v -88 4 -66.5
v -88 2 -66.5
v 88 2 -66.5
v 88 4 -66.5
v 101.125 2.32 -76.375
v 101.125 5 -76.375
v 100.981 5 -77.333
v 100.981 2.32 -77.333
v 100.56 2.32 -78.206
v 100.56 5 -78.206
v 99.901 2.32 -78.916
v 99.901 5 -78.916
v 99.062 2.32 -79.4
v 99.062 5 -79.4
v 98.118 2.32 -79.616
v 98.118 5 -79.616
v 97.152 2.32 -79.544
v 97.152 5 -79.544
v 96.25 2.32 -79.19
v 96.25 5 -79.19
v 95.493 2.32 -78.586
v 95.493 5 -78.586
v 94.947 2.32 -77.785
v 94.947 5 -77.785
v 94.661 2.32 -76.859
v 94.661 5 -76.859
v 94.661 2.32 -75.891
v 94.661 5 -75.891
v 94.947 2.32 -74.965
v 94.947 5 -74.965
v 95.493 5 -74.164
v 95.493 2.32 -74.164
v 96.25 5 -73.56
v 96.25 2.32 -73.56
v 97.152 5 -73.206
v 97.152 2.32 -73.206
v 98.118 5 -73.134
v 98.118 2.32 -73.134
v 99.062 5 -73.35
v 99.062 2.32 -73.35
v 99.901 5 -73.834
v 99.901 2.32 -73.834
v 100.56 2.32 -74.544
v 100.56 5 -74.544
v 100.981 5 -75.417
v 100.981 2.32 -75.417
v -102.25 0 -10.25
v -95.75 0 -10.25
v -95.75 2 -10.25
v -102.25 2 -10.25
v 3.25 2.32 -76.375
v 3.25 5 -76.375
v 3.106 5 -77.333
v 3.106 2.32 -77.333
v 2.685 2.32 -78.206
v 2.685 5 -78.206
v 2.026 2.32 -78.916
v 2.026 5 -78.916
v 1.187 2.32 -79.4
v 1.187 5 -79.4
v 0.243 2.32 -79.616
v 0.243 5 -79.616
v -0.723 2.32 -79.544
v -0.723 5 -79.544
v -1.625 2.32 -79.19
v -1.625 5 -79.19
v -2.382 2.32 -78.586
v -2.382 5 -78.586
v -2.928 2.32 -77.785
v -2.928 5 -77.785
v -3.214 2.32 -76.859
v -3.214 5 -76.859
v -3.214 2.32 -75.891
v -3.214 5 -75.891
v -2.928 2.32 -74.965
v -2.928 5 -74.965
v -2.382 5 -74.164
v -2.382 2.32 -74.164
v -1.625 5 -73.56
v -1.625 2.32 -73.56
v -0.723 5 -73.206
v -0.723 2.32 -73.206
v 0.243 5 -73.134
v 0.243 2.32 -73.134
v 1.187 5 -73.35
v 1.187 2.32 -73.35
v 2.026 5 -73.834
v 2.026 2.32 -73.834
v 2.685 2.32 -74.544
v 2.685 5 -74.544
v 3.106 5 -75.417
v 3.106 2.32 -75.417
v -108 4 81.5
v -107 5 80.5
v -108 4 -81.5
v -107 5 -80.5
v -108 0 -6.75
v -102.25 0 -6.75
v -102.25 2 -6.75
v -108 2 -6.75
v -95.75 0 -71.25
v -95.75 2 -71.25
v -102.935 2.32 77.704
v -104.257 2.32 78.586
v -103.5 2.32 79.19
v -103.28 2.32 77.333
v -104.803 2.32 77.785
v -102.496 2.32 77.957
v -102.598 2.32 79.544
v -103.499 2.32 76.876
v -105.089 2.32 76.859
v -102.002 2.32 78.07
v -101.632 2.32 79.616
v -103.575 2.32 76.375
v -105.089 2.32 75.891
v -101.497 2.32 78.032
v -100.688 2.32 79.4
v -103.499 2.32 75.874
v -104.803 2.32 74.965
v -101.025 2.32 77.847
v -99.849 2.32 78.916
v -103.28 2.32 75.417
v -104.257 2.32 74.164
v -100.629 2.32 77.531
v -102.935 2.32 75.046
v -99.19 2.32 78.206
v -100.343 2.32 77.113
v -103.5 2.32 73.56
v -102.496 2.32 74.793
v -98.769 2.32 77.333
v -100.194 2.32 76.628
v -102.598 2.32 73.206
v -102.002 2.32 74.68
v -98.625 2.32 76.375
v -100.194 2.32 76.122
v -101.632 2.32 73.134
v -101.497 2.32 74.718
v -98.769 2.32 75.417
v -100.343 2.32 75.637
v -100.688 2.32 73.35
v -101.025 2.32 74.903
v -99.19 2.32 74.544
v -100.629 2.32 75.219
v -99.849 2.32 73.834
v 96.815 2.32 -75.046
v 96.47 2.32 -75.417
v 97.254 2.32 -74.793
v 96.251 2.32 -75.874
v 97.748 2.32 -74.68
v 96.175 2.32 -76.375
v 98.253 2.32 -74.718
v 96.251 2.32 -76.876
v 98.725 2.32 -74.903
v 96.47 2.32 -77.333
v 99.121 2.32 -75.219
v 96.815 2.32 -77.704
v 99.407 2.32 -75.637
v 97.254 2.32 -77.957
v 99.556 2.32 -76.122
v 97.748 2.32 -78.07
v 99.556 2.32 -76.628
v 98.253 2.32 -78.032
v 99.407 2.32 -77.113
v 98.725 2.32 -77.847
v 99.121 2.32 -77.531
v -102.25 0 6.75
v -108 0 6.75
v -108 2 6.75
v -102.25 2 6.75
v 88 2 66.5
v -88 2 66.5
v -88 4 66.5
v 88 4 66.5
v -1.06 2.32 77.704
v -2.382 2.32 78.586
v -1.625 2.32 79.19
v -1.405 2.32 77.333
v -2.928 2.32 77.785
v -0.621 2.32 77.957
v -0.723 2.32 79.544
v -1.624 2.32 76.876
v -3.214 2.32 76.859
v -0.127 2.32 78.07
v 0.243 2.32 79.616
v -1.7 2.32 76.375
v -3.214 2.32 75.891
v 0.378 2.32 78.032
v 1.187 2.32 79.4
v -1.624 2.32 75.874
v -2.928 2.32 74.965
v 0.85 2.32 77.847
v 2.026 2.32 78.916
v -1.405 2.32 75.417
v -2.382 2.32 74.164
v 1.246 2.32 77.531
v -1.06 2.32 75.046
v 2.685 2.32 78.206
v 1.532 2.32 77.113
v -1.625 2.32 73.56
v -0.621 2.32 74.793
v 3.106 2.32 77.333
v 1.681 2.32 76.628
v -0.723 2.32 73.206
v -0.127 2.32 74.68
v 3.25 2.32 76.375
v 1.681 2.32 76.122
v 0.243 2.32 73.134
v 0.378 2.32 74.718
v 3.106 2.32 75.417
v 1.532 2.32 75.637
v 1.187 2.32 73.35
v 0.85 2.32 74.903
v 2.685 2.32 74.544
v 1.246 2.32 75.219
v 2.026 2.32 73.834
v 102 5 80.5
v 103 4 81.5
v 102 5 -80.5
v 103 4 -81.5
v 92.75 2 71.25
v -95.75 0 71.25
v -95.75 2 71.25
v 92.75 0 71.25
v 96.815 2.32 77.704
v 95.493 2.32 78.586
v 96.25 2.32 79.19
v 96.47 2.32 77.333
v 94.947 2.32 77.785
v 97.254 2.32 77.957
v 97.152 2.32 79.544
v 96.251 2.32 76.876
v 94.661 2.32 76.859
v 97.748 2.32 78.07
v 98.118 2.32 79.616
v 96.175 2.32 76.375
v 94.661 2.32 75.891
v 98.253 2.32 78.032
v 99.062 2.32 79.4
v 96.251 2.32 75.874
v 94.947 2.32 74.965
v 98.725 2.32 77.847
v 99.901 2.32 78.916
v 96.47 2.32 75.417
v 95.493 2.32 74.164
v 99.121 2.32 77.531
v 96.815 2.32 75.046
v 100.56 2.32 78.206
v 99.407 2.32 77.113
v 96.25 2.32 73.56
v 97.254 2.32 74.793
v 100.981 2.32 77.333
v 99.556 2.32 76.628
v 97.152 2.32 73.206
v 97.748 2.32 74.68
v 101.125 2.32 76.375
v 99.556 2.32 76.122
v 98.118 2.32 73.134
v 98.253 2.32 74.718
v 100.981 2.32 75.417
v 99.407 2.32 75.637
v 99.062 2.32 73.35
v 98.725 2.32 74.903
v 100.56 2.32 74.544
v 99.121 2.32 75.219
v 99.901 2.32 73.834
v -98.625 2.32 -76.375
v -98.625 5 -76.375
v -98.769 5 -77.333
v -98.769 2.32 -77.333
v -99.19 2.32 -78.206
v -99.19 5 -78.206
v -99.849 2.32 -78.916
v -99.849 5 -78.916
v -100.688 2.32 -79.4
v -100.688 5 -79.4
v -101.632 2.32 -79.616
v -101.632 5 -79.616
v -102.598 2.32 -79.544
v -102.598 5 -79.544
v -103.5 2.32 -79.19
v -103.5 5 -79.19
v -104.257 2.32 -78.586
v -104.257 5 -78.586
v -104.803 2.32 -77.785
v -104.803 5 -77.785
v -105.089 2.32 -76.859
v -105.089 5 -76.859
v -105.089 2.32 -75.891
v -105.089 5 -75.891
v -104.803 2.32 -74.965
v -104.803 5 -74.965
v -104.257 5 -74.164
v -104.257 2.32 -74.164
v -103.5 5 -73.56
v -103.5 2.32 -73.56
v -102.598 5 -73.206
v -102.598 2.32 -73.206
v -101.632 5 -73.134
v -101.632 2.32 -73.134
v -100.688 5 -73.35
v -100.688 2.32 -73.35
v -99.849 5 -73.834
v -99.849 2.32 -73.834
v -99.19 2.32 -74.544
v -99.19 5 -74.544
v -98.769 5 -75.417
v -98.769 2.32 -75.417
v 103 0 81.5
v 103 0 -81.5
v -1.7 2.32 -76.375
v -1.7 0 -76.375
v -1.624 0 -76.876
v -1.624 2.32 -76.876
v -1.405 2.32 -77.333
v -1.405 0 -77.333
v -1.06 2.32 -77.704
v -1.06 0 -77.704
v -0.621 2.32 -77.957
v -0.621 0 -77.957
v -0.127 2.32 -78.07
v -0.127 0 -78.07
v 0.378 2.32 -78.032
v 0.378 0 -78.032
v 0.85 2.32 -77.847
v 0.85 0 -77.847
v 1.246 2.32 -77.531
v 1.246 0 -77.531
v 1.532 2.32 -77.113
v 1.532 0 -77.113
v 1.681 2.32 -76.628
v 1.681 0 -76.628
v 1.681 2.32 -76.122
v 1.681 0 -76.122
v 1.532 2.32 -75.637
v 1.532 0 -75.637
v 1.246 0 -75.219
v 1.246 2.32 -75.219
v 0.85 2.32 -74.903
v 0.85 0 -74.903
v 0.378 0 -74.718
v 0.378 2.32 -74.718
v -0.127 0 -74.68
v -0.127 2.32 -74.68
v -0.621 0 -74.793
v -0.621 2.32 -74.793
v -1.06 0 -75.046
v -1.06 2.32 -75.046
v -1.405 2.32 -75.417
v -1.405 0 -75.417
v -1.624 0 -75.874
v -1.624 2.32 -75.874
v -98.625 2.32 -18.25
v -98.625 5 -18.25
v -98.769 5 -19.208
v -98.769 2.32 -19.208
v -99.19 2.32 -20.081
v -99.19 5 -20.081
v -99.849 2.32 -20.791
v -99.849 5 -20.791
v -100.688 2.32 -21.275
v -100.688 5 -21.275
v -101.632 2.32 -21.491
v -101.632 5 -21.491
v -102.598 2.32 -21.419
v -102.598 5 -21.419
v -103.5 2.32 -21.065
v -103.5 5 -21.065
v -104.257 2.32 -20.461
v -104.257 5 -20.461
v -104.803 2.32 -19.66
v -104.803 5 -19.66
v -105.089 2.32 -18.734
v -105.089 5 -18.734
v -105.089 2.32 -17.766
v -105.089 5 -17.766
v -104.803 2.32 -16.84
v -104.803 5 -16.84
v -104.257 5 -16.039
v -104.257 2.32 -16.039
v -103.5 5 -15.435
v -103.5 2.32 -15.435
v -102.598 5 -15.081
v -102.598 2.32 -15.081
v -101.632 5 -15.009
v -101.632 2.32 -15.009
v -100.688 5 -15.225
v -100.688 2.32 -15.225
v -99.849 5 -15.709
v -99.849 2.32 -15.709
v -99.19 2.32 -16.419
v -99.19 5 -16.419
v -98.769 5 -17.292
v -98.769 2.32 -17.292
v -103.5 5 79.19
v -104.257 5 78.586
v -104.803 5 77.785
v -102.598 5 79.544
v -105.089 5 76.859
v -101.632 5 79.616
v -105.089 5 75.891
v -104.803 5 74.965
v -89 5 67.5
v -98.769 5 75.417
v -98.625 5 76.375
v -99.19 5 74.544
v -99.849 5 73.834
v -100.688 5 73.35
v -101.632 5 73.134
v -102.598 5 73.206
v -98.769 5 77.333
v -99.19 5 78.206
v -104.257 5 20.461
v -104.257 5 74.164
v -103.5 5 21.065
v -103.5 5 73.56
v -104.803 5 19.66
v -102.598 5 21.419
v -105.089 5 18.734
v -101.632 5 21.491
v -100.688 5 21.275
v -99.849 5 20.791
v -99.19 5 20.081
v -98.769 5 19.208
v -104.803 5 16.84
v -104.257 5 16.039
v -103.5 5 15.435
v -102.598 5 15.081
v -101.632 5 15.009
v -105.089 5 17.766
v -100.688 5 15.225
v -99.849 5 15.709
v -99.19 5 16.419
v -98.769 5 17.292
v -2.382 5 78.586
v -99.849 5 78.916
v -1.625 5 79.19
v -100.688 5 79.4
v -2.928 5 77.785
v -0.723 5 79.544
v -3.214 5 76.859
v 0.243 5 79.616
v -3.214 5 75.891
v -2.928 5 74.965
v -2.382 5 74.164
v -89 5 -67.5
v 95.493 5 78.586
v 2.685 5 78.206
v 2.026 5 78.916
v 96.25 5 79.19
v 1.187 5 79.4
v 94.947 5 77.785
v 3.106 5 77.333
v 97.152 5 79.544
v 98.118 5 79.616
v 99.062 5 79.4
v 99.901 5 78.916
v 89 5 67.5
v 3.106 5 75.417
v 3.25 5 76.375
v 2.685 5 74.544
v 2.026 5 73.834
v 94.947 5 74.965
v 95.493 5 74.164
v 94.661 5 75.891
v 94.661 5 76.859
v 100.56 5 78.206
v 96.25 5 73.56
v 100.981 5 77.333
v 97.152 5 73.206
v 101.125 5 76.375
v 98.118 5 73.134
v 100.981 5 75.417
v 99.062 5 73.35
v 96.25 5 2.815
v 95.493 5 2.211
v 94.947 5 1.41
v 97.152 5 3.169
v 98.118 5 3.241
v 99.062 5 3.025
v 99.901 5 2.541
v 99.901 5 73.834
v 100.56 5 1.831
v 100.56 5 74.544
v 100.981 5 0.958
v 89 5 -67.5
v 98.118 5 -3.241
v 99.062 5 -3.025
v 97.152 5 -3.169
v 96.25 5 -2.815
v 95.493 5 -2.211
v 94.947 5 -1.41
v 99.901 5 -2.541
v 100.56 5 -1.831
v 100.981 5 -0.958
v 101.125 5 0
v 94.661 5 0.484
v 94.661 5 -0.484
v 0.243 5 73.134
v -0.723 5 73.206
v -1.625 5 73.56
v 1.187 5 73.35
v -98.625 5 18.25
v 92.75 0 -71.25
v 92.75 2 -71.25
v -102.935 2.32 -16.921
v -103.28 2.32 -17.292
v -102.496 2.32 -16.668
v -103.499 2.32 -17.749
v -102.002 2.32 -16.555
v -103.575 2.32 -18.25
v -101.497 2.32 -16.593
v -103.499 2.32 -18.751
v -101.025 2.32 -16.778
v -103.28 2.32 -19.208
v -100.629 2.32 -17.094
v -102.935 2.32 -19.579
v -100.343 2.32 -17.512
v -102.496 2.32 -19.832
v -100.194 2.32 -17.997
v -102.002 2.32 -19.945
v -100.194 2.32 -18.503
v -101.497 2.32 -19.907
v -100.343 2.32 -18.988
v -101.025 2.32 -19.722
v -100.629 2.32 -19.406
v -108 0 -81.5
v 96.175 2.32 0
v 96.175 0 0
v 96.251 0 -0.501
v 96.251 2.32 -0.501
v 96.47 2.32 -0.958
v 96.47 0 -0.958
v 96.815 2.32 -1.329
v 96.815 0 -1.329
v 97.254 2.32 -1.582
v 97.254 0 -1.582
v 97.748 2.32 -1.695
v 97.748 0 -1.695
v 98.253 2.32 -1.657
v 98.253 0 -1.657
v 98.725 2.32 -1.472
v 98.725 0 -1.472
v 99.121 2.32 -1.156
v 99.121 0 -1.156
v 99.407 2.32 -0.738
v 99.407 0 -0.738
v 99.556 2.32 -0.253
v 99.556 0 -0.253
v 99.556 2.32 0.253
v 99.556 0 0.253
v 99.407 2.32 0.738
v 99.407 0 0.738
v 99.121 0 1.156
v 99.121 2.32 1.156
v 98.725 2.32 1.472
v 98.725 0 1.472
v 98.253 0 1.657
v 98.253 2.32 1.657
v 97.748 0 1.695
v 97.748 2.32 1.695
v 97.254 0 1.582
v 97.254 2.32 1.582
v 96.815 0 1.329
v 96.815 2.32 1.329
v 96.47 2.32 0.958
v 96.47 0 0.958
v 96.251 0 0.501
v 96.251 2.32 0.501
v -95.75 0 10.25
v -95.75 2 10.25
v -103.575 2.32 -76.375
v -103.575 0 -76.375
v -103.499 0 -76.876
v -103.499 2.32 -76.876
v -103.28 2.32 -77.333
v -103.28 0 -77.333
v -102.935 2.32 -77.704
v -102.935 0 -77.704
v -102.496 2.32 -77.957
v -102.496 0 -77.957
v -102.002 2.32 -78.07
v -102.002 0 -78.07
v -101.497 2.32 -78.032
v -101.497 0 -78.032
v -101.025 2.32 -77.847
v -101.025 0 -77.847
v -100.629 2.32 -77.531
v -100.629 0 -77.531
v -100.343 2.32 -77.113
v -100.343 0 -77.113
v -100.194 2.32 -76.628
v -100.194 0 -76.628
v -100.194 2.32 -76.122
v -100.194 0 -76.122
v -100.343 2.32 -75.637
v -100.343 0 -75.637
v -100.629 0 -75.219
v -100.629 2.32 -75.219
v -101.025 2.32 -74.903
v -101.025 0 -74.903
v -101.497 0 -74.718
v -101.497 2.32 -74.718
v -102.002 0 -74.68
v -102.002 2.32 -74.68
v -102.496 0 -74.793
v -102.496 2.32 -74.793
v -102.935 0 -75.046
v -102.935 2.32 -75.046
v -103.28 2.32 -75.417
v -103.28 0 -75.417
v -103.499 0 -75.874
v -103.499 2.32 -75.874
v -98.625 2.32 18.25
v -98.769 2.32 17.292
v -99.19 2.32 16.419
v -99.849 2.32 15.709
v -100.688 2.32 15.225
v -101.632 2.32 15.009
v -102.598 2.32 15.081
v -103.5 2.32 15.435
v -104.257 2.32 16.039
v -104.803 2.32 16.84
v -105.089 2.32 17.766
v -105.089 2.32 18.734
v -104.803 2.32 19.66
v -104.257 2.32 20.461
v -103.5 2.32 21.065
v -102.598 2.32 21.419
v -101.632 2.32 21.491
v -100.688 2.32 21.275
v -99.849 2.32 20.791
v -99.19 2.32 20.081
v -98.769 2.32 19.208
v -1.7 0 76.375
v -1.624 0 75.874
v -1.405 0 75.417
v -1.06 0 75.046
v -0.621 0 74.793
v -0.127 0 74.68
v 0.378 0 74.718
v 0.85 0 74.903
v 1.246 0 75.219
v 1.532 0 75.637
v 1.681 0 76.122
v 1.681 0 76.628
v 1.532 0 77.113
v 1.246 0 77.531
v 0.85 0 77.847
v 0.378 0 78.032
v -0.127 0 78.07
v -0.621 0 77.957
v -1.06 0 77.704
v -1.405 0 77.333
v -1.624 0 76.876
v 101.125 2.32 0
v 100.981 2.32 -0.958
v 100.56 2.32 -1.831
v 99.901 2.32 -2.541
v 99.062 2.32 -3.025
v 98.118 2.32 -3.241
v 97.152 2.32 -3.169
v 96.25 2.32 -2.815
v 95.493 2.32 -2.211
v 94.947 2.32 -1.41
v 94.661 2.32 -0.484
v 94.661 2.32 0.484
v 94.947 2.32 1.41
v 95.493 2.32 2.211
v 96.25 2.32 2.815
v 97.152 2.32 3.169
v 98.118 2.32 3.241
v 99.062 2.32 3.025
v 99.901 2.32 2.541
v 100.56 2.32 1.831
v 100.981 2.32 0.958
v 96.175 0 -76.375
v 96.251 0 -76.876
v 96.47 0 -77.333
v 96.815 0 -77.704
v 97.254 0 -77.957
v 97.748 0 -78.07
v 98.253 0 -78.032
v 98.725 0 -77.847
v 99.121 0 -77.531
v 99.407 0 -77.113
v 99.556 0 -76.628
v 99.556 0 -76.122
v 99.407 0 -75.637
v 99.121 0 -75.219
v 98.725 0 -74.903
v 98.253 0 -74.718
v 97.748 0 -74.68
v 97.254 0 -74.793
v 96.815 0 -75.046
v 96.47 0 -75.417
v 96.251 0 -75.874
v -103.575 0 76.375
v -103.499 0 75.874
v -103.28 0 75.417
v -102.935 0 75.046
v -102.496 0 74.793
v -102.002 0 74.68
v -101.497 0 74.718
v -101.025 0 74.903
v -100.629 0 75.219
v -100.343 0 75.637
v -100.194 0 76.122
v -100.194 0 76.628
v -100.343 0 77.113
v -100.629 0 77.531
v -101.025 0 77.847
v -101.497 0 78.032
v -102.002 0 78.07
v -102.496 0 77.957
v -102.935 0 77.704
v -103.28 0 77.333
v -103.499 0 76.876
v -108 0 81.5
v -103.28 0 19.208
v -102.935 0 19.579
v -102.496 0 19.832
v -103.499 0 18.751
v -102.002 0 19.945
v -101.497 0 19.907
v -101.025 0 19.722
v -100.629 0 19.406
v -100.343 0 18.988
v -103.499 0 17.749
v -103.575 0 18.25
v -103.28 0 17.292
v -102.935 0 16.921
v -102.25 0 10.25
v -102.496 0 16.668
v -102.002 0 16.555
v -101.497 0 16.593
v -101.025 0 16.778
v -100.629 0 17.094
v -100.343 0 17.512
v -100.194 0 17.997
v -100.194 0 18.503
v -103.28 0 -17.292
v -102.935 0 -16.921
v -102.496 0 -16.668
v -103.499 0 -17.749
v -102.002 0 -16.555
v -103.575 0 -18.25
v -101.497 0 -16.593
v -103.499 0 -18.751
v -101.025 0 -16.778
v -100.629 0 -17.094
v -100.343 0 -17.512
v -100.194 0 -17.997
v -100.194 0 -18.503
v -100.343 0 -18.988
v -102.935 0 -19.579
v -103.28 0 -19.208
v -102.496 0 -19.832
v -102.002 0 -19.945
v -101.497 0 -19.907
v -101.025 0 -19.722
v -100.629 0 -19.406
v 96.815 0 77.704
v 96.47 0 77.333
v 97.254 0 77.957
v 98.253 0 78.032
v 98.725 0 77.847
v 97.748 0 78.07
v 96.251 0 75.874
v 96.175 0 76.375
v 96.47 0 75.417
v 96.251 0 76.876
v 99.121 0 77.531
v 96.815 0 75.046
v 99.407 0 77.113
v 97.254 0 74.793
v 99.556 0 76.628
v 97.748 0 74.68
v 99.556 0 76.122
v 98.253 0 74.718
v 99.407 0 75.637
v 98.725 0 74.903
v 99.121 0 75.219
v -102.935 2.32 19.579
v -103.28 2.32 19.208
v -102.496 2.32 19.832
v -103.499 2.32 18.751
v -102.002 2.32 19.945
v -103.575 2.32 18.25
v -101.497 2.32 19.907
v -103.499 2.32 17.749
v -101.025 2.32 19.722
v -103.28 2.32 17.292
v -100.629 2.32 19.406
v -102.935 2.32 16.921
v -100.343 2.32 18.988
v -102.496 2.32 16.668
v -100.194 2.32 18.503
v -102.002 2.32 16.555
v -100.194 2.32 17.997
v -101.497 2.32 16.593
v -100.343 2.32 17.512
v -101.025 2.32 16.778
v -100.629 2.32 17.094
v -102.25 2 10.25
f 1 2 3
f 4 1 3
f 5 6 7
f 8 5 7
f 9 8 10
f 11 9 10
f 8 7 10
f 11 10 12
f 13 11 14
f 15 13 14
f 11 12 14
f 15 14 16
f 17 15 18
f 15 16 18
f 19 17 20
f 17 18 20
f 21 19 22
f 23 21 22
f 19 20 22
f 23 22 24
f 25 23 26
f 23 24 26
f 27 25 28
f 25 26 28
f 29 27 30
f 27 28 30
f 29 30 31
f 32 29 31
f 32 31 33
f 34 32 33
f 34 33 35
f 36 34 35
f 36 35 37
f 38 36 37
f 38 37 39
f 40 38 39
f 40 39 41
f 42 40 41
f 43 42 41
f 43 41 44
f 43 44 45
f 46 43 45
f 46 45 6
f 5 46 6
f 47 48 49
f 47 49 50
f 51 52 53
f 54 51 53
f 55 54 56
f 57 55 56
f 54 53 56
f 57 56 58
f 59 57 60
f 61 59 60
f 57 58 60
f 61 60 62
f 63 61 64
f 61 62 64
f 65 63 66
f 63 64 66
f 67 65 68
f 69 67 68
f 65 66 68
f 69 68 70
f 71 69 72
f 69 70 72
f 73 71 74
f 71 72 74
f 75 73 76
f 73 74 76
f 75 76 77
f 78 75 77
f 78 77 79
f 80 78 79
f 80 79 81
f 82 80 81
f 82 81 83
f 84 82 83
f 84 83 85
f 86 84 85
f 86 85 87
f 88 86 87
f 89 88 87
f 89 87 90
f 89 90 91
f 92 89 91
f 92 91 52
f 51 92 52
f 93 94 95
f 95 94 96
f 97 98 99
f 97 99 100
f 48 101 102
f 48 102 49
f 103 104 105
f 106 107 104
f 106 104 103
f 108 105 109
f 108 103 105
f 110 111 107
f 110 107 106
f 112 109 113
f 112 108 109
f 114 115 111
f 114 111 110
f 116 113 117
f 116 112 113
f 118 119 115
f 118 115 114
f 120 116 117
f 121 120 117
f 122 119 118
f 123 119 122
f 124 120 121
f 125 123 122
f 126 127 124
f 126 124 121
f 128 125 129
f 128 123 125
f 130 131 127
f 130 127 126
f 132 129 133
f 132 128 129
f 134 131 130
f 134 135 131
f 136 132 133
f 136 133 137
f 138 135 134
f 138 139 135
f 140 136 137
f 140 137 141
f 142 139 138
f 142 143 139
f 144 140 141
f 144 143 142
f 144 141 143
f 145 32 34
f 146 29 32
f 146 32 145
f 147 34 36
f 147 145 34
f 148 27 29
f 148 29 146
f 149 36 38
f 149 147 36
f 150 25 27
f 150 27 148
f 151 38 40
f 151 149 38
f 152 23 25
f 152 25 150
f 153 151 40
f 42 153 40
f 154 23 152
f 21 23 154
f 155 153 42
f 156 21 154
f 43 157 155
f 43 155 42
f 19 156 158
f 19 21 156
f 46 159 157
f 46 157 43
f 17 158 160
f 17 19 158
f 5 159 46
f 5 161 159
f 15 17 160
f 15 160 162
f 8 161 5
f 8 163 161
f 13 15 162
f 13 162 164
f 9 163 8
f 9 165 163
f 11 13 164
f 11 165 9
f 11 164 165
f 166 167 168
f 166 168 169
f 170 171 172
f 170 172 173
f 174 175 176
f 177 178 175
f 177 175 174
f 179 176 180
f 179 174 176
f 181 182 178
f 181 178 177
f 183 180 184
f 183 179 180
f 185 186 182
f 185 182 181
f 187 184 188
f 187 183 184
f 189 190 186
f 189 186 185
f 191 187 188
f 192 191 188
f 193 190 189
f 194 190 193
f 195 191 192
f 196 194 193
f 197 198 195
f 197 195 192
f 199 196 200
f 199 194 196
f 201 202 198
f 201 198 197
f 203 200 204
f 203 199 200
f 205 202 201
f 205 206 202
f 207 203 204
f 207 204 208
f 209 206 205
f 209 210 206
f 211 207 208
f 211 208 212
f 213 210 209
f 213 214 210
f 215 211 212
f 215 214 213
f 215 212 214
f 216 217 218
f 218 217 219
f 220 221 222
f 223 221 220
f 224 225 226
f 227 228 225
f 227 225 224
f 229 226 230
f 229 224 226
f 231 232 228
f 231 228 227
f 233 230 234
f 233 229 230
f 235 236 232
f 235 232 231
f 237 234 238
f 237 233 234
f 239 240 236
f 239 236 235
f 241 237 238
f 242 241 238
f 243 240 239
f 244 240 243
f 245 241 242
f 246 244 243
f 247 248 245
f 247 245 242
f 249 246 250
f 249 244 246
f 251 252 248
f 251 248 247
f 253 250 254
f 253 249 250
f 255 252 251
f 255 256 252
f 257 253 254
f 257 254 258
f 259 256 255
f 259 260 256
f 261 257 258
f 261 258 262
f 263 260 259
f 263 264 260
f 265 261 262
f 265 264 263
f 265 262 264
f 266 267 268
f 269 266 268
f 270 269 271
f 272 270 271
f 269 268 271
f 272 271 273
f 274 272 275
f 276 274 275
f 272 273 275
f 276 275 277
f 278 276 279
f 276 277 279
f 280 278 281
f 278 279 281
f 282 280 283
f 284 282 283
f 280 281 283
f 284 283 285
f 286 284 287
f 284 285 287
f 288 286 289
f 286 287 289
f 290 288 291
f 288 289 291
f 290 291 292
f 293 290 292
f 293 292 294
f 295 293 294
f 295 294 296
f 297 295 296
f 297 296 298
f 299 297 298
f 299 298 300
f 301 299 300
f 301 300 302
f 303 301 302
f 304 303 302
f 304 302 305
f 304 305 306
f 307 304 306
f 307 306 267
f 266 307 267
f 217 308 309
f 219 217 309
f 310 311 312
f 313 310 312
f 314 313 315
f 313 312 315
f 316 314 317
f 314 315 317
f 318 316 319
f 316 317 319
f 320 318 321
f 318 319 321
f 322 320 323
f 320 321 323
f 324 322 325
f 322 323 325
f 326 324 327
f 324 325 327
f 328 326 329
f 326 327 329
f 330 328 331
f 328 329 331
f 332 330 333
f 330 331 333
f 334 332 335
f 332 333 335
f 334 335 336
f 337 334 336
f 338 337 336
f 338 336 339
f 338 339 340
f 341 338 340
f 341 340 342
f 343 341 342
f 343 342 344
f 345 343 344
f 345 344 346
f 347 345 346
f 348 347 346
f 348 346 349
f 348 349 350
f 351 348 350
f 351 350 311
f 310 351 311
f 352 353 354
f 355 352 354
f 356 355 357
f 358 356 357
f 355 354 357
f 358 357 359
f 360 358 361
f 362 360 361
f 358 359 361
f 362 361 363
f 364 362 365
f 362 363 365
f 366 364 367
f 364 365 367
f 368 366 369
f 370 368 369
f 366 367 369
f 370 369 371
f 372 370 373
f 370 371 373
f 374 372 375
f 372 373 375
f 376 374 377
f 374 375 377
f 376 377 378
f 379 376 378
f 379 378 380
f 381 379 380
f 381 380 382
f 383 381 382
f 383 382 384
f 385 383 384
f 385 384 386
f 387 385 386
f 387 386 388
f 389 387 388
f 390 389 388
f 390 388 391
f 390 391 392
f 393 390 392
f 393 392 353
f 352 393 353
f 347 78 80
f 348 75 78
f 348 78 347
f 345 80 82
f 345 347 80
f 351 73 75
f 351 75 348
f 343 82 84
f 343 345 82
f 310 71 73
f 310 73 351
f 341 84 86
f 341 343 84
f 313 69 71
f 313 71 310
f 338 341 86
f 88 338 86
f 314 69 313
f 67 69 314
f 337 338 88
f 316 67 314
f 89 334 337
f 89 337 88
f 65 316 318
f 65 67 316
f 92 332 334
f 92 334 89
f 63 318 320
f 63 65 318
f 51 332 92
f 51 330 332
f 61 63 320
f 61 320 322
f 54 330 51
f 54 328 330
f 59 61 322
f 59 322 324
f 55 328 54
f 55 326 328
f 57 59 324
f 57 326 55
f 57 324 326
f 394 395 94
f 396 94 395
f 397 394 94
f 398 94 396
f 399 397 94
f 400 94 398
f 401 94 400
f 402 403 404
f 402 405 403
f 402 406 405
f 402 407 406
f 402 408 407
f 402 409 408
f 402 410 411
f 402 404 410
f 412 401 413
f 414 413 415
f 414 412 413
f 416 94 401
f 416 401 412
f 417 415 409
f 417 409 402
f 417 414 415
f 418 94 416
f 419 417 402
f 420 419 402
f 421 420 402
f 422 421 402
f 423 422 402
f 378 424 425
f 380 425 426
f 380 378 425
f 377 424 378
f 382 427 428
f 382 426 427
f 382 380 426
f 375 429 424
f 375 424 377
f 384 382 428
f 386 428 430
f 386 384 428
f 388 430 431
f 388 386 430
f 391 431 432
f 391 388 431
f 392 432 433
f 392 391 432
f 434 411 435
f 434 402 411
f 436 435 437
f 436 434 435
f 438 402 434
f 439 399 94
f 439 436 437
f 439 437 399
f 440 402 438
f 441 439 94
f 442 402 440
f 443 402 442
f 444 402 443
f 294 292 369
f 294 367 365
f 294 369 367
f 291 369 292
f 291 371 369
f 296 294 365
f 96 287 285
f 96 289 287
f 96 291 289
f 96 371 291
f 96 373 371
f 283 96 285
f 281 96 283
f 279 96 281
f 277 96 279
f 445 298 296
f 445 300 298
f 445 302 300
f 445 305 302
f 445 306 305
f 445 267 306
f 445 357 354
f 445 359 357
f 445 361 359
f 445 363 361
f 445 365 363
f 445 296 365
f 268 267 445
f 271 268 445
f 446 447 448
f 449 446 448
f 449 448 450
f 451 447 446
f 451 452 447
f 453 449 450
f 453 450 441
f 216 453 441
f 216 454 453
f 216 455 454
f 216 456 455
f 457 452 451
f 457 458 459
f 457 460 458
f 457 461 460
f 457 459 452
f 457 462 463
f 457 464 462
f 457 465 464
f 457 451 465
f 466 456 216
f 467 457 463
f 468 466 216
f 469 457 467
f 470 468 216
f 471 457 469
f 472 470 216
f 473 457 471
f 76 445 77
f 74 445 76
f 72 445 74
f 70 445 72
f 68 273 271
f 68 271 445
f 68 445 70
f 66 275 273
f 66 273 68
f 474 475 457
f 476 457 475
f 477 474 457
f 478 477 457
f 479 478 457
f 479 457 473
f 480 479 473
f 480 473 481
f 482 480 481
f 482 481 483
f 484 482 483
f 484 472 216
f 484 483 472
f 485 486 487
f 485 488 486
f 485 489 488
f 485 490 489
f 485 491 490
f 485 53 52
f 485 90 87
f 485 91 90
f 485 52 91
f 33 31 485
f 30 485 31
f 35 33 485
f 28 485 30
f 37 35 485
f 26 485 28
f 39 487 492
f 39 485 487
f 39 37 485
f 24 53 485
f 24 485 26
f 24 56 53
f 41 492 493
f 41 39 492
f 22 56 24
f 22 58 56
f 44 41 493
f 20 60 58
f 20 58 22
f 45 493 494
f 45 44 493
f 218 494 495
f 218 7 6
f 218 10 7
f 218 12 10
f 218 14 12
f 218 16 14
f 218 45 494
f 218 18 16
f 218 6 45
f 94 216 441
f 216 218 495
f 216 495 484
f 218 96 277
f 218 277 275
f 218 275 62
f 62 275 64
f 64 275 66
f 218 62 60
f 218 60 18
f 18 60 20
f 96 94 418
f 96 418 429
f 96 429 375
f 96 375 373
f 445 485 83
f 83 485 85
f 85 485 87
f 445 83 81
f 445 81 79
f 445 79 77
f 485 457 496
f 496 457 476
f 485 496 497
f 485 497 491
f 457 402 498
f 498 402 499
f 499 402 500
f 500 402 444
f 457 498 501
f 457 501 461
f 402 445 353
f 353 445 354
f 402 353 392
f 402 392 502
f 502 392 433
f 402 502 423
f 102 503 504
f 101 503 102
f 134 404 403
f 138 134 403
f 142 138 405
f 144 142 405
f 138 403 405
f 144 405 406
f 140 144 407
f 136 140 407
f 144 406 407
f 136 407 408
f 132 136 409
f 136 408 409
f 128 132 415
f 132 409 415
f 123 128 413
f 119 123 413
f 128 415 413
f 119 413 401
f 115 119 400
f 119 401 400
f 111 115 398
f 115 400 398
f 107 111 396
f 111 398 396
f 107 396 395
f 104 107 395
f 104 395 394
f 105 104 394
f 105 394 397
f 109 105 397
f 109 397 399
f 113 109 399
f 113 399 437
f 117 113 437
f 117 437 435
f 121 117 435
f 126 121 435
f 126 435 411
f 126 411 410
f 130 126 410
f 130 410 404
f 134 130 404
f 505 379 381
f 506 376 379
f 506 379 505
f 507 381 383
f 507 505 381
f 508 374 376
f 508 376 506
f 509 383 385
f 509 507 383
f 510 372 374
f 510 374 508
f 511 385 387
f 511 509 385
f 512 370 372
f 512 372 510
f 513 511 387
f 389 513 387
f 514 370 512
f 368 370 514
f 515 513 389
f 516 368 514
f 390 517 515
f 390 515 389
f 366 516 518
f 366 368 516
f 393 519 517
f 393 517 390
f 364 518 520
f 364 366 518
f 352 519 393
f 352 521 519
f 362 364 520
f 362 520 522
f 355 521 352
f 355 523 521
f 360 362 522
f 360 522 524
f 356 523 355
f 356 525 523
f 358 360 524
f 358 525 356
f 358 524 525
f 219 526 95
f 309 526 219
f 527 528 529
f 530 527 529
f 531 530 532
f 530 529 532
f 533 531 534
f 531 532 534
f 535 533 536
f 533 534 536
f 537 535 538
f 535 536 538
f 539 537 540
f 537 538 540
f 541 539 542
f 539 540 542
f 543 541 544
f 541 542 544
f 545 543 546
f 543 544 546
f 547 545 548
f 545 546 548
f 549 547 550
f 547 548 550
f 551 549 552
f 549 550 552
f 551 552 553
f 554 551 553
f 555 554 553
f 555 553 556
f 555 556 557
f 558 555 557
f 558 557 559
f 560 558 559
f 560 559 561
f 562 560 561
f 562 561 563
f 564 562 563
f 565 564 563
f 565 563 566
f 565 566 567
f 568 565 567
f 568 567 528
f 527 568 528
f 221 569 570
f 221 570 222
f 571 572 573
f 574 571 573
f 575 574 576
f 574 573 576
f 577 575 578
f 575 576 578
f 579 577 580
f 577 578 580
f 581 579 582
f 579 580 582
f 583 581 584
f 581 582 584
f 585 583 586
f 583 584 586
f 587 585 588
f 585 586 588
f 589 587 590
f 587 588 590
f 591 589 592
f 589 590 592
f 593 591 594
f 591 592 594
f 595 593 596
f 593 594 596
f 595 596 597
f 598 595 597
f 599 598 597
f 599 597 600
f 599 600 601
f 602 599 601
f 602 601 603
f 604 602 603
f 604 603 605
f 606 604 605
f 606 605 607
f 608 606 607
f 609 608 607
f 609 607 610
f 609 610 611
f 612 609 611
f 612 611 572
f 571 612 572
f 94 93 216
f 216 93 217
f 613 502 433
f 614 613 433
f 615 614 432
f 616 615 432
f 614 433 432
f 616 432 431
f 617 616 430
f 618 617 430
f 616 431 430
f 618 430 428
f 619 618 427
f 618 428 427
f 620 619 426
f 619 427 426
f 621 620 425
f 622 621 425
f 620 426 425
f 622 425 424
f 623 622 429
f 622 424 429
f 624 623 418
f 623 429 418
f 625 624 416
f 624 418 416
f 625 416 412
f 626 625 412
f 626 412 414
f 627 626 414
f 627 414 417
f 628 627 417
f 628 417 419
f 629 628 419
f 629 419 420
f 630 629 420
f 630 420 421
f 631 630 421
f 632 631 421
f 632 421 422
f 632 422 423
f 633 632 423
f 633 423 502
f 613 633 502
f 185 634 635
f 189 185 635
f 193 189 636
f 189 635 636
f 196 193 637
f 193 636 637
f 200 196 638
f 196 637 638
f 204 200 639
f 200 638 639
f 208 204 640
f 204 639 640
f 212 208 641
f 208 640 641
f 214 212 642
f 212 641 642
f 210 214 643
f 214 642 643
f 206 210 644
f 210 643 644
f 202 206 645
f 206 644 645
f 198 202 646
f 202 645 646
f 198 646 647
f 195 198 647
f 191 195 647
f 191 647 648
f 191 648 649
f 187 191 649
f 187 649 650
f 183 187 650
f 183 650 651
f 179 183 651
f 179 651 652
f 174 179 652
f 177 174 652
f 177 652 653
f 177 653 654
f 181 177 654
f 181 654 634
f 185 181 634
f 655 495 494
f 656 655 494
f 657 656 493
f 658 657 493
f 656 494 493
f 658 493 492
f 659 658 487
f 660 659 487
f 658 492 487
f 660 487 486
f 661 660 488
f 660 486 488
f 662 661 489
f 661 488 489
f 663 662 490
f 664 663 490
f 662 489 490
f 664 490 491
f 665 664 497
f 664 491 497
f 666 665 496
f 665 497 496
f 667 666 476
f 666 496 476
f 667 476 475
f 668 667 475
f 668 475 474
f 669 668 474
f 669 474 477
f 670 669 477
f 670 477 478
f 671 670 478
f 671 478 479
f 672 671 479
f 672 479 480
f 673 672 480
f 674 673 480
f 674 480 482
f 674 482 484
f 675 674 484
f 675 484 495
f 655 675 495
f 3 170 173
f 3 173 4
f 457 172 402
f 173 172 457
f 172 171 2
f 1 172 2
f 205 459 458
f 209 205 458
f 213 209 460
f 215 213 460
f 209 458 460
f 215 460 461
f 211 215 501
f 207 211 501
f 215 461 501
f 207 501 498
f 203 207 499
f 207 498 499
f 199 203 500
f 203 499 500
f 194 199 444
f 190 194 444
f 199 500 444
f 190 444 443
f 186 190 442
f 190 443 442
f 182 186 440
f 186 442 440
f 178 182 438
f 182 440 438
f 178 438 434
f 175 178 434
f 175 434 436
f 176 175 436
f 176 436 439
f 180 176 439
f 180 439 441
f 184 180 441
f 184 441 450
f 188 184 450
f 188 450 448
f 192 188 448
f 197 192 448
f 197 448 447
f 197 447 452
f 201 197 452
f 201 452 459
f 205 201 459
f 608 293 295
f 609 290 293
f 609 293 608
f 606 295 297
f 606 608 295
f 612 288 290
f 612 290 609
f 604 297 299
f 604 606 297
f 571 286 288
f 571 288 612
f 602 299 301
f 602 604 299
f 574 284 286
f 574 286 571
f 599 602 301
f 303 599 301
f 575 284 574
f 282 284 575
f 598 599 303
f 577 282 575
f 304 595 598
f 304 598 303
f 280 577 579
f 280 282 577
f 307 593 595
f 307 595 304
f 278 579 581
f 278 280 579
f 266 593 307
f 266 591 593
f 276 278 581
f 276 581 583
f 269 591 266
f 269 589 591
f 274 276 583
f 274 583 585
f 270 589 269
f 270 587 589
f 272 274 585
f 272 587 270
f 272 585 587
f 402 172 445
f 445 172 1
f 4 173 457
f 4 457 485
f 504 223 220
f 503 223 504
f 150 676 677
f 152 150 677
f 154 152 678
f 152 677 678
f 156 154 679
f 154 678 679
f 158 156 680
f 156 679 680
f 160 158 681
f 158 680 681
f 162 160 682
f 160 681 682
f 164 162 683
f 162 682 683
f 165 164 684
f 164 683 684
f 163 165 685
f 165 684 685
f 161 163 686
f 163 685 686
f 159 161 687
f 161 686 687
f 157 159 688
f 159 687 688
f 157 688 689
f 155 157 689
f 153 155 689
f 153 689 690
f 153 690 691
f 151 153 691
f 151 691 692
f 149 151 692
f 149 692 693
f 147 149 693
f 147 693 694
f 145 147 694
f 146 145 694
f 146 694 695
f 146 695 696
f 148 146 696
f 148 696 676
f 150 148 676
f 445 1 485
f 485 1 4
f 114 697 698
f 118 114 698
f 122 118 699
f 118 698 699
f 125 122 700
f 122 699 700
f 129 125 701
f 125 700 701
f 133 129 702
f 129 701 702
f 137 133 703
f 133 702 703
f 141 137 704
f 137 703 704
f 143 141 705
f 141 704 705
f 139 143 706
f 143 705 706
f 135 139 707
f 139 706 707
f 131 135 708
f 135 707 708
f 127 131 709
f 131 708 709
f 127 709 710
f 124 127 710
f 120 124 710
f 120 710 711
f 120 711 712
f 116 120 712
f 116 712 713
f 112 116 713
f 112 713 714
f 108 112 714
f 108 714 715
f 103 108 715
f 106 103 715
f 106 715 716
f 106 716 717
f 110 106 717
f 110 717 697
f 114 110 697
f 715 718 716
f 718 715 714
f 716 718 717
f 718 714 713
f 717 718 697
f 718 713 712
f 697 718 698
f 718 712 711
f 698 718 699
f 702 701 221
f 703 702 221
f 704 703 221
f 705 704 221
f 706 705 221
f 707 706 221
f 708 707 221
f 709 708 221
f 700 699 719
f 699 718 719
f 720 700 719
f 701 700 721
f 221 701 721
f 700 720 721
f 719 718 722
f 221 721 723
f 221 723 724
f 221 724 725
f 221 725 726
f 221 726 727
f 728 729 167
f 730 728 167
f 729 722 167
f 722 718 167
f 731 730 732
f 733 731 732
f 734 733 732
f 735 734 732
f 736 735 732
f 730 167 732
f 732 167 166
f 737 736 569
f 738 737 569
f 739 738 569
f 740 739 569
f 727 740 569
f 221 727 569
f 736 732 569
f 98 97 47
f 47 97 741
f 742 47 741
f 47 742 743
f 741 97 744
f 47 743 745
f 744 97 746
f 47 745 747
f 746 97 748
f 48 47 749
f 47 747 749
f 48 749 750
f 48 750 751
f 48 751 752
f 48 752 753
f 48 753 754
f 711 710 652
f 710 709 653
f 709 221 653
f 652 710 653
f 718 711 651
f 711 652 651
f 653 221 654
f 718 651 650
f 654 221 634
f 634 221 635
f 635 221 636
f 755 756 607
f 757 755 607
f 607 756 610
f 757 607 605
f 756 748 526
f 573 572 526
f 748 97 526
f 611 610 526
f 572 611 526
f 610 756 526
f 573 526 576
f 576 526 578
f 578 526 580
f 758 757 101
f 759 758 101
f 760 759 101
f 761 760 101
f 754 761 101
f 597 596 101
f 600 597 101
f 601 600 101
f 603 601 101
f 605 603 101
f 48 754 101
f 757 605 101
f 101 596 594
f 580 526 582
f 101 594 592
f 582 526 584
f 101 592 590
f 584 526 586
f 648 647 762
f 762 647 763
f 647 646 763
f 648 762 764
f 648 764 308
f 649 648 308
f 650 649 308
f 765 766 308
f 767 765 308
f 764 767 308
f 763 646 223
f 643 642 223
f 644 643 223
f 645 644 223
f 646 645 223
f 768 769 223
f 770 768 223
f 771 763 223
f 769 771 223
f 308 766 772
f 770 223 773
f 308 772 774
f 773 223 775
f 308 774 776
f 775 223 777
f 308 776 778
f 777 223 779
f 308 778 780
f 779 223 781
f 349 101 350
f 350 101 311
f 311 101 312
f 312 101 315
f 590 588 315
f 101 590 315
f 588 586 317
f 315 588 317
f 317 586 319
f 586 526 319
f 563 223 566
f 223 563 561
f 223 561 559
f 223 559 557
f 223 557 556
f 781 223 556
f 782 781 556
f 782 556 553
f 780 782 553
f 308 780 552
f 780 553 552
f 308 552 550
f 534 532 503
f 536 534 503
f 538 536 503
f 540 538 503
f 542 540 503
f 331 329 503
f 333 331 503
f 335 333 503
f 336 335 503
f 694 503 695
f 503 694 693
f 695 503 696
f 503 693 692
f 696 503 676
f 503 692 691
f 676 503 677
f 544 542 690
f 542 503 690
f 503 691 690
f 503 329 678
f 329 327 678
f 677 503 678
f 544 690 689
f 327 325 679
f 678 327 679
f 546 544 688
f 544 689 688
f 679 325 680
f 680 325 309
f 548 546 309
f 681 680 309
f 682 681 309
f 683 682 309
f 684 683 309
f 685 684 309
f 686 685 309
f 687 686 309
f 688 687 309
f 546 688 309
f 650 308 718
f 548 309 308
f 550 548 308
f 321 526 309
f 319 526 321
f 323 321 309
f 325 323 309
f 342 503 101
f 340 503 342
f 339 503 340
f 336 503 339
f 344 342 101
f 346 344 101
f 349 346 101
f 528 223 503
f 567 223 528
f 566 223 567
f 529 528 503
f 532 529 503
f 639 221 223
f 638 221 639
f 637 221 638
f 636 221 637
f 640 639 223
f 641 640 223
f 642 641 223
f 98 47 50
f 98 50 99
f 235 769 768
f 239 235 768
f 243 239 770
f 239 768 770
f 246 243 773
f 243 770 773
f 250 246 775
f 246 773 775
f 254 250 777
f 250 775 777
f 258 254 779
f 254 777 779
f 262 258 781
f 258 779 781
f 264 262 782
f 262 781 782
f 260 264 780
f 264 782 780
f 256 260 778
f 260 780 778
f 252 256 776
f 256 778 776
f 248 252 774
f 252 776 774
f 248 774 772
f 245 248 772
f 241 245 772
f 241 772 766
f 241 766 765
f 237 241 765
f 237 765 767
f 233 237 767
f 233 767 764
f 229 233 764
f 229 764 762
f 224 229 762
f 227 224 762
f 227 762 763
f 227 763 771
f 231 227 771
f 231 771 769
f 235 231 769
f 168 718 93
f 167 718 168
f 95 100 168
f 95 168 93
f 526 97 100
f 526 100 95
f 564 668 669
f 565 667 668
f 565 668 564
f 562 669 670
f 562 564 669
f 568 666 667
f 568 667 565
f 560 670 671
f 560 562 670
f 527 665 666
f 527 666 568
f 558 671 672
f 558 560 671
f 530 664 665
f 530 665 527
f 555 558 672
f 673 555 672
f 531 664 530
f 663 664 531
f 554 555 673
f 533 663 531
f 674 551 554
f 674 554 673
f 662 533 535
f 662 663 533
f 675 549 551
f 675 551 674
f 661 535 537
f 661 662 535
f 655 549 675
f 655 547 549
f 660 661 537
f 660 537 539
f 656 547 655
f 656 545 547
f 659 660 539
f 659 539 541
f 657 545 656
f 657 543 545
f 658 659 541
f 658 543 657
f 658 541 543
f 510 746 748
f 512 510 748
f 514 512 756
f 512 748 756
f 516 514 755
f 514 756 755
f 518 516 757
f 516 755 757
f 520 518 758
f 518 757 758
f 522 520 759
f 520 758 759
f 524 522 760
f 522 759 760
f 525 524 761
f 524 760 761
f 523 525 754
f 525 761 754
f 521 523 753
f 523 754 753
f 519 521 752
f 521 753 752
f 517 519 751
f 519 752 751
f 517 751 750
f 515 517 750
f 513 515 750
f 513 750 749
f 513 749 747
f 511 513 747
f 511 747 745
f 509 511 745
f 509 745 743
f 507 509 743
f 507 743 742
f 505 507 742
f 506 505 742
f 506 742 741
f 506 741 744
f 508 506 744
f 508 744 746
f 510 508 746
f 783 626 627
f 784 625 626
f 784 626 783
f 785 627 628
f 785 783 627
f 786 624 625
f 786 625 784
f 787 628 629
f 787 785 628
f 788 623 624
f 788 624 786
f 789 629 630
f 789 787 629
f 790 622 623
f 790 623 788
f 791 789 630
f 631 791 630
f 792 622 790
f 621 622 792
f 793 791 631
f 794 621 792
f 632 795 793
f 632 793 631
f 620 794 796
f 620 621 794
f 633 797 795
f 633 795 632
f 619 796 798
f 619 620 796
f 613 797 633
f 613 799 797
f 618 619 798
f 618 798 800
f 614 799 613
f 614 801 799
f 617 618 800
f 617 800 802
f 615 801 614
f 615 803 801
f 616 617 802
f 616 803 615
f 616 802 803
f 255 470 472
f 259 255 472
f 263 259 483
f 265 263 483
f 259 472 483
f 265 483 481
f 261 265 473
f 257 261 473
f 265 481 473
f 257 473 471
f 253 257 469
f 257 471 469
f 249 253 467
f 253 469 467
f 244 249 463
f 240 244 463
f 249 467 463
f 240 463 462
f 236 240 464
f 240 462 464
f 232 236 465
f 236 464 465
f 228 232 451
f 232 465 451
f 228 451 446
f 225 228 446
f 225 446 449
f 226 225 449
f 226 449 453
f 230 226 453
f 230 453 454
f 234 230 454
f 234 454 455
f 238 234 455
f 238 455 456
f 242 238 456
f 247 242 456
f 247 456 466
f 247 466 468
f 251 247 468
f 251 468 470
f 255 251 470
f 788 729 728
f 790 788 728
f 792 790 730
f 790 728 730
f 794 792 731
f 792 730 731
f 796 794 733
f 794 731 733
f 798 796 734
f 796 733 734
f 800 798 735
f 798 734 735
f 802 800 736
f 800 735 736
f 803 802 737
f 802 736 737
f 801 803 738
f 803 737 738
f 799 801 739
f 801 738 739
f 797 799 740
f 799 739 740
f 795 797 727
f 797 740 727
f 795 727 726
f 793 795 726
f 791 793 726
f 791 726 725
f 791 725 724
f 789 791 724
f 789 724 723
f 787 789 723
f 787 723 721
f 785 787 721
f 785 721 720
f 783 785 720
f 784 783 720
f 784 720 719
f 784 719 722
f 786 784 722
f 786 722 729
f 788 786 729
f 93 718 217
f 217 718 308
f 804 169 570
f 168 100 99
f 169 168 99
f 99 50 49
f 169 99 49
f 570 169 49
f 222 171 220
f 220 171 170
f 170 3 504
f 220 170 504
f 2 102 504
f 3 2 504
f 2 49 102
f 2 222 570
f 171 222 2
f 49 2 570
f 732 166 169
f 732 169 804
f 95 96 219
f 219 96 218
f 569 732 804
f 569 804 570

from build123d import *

# Parameters (mm, degrees)
SKETCH1_W                      = 211
SKETCH1_H                      = 163
SKETCH1_W_2                    = 176
SKETCH1_H_2                    = 133
BOSS_EXTRUDE1_DEPTH            = 5
CUT_EXTRUDE1_START             = -5
CUT_EXTRUDE1_DEPTH             = 2
CBORE_FOR_M3_SHCS1_D           = 3.4
CBORE_FOR_M3_SHCS1_DEPTH       = 5
CBORE_FOR_M3_SHCS1_CBORE_D     = 6.5
CBORE_FOR_M3_SHCS1_CBORE_DEPTH = 2.68
CHAMFER2_SIZE                  = 1


with BuildPart() as part:
    # Sketch1 → Boss-Extrude1 (new body)
    with BuildSketch(Plane(origin=(0, 0, 0), x_dir=(1, 0, 0), z_dir=(0, 1, 0))):
        with Locations((-2.5, 0)):
            Rectangle(SKETCH1_W, SKETCH1_H)
        Rectangle(SKETCH1_W_2, SKETCH1_H_2, mode=Mode.SUBTRACT)
    extrude(amount=BOSS_EXTRUDE1_DEPTH)

    # Sketch2 → Cut-Extrude1 (cut)
    with BuildSketch(Plane(origin=(0, 5, 0), x_dir=(1, 0, 0), z_dir=(0, 1, 0)).offset(CUT_EXTRUDE1_START)):
        Polygon((-95.75, -71.25), (92.75, -71.25), (92.75, 71.25), (-95.75, 71.25), (-95.75, 10.25), (-102.25, 10.25), (-102.25, 6.75), (-108, 6.75), (-108, -6.75), (-102.25, -6.75), (-102.25, -10.25), (-95.75, -10.25), align=None)
    extrude(amount=CUT_EXTRUDE1_DEPTH, mode=Mode.SUBTRACT)

    # CBORE for M3 SHCS1
    with Locations(Plane(origin=(0, 5, 0), x_dir=(1, 0, 0), z_dir=(0, 1, 0))):
        with Locations((-101.875, 76.375), (0, 76.375), (97.875, 76.375), (97.875, -76.375), (97.875, 0), (0, -76.375), (-101.875, -76.375), (-101.875, -18.25), (-101.875, 18.25)):
            CounterBoreHole(CBORE_FOR_M3_SHCS1_D / 2, CBORE_FOR_M3_SHCS1_CBORE_D / 2, CBORE_FOR_M3_SHCS1_CBORE_DEPTH, depth=CBORE_FOR_M3_SHCS1_DEPTH)

    # Chamfer2
    chamfer2_edges = [part.edges().sort_by_distance(p)[0] for p in [
        (-2.5, 5, 81.5),
        (0, 5, -66.5),
        (-88, 5, 0),
        (0, 5, 66.5),
        (-108, 5, 0),
        (88, 5, 0),
        (-2.5, 5, -81.5),
        (103, 5, 0),
    ]]
    chamfer(chamfer2_edges, length=CHAMFER2_SIZE)


solid = part.part
